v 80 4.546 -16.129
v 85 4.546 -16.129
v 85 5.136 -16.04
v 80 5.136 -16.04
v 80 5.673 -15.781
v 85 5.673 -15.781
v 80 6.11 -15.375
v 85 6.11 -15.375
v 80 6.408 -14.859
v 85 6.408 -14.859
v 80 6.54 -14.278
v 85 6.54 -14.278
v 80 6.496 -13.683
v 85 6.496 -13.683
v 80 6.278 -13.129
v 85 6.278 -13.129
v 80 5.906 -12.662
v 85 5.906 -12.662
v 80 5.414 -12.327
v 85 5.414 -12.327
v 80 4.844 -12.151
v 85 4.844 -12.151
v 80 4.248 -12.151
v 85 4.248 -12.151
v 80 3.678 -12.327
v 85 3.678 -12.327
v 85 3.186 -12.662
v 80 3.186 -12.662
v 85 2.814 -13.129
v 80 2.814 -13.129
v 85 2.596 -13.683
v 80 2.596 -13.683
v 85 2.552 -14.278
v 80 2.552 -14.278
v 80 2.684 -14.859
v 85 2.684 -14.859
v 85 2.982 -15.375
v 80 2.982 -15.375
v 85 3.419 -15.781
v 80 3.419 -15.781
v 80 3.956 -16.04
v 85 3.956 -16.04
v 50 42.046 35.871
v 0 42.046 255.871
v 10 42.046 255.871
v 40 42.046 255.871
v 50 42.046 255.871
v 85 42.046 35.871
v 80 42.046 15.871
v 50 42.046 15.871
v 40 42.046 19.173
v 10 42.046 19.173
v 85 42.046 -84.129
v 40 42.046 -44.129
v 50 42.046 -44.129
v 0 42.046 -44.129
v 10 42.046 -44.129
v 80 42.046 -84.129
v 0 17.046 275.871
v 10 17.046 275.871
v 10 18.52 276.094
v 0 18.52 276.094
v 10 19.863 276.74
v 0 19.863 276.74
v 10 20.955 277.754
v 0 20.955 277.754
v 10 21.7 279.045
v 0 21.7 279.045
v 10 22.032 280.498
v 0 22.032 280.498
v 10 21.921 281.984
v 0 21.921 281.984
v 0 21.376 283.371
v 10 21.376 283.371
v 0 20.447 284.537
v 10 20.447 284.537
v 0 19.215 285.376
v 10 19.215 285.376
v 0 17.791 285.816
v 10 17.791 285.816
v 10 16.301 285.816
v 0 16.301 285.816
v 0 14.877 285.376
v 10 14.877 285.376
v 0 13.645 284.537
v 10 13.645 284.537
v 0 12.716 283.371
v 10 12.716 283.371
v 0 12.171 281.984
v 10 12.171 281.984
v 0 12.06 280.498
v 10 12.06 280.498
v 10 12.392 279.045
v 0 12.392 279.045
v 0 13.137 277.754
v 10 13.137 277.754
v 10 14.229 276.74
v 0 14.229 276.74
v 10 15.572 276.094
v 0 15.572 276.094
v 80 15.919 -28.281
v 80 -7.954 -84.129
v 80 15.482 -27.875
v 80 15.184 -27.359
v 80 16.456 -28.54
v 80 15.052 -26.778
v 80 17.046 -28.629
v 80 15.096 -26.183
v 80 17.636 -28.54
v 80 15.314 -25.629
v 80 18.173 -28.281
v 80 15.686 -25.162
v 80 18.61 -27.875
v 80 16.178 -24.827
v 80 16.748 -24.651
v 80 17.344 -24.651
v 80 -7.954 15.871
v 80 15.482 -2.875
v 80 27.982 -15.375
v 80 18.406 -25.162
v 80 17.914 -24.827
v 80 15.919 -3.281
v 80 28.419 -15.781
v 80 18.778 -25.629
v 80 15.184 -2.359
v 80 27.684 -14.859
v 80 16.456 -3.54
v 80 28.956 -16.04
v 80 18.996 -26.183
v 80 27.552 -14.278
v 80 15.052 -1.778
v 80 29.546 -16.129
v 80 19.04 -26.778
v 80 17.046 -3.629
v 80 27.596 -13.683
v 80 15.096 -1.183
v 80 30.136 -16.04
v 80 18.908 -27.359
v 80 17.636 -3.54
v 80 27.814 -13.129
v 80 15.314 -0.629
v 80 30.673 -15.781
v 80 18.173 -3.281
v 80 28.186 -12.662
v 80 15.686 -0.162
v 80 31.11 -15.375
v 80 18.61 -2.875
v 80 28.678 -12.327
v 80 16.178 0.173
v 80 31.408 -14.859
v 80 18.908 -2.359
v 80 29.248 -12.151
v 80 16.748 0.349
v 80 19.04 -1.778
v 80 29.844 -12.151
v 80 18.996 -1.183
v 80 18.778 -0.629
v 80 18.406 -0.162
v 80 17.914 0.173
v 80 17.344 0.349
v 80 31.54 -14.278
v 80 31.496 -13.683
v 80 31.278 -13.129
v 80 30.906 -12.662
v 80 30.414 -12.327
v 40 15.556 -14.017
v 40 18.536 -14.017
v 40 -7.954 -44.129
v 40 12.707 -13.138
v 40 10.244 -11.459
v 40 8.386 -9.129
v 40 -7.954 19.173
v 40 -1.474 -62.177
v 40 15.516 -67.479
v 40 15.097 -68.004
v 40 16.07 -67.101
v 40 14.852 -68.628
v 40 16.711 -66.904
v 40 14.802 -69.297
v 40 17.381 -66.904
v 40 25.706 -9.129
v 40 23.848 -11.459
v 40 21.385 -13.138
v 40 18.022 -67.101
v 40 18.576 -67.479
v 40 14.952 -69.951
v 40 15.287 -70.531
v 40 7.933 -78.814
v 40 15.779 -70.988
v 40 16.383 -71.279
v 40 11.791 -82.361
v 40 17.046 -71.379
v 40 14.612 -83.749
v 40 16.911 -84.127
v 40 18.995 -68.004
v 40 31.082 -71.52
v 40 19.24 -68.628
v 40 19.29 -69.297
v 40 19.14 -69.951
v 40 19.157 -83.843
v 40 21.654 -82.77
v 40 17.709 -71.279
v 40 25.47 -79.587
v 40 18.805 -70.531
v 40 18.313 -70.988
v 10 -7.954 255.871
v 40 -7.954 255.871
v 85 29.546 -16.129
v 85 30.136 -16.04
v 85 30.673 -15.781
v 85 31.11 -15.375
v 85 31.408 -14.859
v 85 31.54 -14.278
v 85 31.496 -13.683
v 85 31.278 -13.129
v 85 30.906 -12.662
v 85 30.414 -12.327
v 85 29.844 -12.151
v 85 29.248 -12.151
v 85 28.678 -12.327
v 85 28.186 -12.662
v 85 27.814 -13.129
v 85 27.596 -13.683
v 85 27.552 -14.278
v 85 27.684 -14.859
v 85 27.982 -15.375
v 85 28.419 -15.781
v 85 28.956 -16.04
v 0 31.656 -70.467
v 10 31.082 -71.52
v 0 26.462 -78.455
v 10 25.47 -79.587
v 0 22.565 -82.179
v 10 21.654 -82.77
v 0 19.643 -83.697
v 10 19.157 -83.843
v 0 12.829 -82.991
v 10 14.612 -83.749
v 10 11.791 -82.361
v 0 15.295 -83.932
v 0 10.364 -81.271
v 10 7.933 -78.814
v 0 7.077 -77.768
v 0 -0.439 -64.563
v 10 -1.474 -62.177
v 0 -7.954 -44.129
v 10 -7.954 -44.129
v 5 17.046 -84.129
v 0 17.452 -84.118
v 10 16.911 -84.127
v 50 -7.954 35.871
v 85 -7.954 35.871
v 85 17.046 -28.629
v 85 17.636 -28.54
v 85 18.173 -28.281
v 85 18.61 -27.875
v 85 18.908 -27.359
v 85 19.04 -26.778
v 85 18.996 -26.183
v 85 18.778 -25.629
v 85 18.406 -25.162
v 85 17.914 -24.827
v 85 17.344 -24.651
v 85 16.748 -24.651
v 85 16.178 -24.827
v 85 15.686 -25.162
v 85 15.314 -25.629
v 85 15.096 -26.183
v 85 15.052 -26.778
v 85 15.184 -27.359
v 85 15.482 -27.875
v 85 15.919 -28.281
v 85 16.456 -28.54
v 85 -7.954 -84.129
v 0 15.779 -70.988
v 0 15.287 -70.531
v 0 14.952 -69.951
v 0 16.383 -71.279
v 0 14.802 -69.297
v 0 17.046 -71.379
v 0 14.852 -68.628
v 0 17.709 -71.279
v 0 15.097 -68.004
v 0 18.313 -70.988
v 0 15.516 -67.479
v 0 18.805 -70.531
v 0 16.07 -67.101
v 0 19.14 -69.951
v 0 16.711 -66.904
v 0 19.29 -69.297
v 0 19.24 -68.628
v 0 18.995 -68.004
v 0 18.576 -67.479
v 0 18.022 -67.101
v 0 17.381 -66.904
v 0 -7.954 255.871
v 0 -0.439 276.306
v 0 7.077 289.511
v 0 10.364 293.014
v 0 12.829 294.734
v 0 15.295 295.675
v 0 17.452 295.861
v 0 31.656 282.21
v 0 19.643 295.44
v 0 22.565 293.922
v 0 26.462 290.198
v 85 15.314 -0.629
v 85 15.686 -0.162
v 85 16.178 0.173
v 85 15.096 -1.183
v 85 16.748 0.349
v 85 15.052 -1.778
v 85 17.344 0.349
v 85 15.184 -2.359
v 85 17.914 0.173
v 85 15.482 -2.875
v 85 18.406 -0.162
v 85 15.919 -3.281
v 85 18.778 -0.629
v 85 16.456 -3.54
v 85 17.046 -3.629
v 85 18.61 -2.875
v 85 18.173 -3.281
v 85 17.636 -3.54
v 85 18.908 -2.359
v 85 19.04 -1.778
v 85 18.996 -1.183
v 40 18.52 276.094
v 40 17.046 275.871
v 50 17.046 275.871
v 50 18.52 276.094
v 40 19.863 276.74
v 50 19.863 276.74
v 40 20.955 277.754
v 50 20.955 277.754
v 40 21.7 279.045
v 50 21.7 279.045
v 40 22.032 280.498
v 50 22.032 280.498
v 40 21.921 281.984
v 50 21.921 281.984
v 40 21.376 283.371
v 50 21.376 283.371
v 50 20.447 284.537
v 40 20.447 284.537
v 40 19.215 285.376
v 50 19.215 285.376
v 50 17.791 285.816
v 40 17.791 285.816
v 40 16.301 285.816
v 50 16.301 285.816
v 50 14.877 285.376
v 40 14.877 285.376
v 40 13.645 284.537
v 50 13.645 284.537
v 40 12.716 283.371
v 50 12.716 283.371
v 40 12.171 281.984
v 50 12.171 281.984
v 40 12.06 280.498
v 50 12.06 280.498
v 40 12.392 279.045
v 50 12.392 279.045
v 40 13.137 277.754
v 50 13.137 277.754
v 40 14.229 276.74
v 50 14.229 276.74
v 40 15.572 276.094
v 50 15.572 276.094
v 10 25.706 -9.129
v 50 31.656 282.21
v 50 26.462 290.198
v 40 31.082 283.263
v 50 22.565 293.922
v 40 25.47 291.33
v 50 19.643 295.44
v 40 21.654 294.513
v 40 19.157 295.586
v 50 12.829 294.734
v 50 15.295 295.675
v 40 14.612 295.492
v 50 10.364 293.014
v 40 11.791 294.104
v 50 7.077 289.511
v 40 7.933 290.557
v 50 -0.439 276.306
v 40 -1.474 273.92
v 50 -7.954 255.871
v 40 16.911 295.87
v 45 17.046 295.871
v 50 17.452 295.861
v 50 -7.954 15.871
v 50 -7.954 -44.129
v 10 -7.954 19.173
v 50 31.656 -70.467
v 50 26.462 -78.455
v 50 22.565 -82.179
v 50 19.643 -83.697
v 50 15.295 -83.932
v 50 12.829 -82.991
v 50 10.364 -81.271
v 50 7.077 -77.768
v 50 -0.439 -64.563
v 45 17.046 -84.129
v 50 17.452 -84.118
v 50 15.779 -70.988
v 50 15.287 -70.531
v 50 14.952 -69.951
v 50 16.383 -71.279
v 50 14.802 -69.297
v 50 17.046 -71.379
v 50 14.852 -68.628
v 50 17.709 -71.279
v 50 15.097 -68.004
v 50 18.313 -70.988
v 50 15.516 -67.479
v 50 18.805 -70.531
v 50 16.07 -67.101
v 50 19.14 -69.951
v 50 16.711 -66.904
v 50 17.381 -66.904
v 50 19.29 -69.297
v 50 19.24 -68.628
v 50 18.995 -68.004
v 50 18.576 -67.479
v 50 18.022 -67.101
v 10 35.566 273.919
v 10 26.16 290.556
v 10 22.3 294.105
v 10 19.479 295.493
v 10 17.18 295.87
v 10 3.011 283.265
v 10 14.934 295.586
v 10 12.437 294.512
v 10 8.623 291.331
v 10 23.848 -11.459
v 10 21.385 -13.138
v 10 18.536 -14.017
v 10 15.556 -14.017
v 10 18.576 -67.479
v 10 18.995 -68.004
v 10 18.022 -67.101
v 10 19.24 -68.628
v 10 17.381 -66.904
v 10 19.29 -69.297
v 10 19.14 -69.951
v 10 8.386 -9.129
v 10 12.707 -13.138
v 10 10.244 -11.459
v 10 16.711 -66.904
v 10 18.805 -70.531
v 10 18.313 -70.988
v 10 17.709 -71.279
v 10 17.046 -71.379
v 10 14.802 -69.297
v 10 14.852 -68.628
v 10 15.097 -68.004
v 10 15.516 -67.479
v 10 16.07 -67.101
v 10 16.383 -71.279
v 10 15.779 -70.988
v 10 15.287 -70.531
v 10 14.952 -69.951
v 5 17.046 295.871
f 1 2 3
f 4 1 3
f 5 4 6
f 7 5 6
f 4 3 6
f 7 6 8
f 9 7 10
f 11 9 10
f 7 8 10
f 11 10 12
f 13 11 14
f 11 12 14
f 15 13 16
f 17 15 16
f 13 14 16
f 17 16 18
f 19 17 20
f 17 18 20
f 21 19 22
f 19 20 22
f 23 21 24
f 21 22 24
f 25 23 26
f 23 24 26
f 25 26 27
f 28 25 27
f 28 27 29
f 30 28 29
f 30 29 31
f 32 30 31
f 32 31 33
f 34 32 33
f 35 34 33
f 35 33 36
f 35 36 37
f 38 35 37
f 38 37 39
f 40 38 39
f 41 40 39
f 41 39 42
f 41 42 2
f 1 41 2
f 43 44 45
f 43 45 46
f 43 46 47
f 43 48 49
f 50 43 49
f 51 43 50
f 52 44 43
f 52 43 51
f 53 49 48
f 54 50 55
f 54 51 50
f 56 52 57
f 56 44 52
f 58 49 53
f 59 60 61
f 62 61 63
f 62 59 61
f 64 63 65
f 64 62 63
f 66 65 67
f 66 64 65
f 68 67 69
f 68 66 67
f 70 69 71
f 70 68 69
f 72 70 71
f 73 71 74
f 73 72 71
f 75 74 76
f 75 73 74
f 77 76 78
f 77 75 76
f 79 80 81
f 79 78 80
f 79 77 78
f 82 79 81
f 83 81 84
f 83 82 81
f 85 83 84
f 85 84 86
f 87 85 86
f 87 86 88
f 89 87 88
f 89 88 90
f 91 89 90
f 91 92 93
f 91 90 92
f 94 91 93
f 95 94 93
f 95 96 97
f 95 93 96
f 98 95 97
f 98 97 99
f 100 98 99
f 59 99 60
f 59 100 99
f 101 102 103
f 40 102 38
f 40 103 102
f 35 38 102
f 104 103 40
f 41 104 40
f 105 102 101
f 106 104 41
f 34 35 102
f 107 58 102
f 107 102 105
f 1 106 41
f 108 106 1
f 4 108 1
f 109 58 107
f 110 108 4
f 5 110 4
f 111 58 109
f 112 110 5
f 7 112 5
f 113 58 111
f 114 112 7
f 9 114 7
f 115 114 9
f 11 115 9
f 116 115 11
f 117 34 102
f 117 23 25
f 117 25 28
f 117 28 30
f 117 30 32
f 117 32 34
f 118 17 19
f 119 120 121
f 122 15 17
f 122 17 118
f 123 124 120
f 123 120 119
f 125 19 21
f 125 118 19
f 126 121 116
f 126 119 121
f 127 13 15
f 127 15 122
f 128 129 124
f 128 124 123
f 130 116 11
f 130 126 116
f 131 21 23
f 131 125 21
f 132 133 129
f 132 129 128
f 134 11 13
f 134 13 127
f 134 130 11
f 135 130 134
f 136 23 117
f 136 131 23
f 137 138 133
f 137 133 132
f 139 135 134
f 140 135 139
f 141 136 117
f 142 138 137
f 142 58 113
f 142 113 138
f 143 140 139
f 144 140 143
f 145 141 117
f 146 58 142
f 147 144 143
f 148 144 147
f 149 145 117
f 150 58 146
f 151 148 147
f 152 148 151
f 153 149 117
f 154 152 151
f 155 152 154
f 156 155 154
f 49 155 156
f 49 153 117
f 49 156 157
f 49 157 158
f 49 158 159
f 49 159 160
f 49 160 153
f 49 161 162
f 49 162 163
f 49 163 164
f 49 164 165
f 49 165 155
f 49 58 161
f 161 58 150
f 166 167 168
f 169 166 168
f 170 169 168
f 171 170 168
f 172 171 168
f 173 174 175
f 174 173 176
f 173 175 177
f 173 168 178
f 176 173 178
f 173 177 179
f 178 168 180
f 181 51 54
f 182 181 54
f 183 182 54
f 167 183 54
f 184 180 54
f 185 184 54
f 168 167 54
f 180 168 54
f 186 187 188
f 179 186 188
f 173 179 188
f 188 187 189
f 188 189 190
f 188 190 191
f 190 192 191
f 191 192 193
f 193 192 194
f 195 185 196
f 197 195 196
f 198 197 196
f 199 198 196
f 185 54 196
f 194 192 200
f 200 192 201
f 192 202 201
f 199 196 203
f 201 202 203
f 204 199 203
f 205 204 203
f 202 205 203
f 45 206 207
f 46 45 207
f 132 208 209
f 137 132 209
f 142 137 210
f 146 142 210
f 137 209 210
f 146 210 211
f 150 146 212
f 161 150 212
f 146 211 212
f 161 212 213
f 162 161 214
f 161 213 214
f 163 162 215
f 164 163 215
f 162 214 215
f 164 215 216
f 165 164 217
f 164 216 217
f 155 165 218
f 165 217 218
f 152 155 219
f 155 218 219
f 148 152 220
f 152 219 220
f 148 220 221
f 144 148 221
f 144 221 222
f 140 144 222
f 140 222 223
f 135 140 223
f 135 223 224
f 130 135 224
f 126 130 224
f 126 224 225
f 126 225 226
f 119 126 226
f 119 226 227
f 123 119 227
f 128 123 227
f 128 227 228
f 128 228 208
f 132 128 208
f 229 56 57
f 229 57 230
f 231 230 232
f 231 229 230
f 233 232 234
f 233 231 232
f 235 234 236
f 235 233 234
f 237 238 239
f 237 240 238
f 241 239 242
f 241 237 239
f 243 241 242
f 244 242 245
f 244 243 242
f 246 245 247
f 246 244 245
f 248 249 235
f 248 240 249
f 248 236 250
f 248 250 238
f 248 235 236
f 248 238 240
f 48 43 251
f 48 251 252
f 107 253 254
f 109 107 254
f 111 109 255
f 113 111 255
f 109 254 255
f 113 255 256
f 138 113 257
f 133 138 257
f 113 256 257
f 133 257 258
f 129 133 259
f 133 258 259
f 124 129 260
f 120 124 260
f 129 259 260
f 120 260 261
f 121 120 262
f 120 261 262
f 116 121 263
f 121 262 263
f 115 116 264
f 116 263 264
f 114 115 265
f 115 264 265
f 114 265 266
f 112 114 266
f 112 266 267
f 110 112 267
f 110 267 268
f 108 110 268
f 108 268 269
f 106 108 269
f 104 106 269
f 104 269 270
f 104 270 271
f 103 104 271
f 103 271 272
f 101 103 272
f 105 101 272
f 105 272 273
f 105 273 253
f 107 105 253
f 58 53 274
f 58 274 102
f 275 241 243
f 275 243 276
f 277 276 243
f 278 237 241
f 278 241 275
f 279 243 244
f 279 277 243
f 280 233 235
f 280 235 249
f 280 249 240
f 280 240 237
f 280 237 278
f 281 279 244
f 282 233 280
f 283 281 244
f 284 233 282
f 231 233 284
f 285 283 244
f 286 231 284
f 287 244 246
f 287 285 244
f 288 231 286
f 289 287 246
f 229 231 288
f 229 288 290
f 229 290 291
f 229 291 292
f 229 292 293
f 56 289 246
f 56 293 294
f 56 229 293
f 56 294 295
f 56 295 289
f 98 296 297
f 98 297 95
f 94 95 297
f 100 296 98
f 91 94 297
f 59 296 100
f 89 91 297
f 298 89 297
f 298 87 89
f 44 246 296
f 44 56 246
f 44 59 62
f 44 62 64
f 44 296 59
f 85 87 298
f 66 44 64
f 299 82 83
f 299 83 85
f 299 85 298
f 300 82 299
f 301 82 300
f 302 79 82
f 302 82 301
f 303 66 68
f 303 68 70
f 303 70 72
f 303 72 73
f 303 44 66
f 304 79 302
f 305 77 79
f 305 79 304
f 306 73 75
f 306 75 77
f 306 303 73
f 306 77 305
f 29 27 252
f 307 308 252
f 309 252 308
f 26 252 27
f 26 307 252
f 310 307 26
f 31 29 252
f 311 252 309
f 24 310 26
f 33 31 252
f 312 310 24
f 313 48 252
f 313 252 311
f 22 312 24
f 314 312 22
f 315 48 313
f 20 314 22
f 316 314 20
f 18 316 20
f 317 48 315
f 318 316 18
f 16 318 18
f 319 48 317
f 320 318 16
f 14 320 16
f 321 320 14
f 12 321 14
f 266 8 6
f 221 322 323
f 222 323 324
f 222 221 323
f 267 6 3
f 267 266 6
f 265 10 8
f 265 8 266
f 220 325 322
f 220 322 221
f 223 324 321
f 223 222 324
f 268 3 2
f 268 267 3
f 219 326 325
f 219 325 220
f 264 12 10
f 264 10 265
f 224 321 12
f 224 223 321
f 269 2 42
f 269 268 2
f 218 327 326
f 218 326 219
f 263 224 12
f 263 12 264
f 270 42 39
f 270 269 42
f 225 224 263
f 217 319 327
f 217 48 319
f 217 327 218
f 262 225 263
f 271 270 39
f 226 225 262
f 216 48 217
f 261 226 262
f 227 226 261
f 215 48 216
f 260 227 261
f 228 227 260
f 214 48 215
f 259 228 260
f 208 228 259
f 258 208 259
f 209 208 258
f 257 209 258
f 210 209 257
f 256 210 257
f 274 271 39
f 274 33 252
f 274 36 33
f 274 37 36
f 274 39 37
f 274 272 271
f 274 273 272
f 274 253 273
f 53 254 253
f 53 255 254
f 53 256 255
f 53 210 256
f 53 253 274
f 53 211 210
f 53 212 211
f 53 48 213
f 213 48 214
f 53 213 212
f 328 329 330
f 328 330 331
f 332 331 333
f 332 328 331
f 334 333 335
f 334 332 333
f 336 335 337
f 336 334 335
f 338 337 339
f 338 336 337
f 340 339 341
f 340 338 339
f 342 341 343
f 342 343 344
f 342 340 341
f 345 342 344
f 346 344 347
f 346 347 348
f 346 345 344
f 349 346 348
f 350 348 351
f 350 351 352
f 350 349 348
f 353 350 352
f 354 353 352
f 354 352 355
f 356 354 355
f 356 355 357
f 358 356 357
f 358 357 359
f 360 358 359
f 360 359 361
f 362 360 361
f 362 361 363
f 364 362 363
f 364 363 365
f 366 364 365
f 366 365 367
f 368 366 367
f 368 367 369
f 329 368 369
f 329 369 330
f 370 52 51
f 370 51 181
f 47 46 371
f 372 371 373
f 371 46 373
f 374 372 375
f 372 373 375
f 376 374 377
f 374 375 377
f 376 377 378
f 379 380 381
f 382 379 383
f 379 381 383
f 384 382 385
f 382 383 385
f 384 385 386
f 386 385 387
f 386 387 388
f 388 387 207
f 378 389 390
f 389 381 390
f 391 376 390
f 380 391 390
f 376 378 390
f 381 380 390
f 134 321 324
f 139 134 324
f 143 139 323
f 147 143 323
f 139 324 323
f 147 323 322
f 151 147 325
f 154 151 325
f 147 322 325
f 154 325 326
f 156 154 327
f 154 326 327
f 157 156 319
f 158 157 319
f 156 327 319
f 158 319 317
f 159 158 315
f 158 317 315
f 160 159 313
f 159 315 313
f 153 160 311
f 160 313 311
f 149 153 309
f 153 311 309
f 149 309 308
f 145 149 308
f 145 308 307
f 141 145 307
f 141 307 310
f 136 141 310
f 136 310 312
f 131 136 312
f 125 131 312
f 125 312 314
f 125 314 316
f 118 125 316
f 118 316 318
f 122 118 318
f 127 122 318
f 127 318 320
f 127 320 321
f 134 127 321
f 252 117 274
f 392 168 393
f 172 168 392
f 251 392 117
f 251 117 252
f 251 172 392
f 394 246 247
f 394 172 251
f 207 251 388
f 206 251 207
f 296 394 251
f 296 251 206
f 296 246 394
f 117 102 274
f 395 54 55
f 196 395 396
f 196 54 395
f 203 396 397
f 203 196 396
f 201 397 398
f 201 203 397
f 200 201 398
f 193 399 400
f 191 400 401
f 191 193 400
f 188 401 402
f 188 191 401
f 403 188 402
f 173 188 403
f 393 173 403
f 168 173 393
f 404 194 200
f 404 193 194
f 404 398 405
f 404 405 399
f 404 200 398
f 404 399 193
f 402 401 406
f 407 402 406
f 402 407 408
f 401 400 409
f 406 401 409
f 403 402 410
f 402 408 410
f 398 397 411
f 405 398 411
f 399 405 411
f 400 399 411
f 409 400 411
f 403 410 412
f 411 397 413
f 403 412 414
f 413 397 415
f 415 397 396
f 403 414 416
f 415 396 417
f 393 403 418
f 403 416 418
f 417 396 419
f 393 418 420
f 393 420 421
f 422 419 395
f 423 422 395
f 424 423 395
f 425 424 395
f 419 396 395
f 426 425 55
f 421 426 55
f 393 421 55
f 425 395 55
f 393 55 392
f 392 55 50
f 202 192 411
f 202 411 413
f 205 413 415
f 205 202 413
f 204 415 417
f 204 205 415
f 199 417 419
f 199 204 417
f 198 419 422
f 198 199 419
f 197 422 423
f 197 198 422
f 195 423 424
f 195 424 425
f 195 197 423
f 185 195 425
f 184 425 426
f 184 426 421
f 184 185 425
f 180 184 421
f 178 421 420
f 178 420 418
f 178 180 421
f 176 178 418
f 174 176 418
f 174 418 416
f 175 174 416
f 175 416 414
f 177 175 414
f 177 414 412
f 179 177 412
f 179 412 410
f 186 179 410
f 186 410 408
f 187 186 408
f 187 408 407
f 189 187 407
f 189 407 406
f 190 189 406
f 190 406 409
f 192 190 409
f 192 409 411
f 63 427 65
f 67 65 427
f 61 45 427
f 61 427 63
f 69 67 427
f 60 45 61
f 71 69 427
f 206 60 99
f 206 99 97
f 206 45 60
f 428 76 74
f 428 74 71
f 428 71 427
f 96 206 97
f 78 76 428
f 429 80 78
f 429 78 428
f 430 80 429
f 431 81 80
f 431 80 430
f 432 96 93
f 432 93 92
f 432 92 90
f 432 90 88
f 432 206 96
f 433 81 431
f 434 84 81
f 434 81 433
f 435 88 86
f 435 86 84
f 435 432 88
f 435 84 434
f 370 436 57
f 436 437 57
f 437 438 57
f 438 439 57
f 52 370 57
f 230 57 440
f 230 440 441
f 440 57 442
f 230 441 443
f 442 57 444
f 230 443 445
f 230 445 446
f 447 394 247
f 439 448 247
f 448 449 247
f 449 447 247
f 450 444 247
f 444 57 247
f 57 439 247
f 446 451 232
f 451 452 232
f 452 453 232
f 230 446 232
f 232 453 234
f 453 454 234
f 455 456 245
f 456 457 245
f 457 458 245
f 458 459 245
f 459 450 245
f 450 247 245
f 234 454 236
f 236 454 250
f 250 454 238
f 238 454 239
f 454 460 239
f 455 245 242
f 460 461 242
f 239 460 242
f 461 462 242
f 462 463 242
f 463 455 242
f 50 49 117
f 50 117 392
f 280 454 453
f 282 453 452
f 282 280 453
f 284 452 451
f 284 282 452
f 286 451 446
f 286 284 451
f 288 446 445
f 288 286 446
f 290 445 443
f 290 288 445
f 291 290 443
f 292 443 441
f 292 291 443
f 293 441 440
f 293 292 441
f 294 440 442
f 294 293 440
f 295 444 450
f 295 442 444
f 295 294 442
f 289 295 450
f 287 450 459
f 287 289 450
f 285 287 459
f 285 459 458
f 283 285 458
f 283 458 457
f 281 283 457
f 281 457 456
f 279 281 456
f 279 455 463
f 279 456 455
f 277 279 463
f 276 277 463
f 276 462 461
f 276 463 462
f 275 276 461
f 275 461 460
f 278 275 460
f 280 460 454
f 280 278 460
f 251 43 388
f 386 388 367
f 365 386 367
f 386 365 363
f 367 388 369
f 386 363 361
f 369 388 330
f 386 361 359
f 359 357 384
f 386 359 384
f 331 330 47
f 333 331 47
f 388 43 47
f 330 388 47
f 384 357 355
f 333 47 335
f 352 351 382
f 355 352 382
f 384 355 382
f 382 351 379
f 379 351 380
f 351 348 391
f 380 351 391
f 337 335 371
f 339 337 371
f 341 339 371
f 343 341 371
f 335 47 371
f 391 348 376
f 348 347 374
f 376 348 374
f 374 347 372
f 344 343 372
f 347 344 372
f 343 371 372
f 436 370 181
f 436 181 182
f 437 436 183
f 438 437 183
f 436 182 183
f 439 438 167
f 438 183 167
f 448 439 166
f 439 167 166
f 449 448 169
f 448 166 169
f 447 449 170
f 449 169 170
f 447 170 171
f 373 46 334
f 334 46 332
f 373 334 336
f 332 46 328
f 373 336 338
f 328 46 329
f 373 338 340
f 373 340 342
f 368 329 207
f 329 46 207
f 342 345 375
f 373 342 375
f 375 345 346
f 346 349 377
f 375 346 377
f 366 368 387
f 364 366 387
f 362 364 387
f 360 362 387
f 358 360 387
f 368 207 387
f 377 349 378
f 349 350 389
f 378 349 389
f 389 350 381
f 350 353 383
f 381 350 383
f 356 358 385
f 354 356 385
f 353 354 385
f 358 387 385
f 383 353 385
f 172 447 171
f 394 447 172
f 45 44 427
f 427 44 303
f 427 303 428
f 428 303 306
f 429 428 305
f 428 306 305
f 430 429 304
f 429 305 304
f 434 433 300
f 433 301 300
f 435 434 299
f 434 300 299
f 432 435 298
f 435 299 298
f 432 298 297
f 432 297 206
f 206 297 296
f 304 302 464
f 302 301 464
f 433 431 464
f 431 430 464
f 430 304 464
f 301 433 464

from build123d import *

# Parameters (mm, degrees)
SKETCH1_R               = 5
SKETCH1_R_2             = 2.25
BOSS_EXTRUDE1_DEPTH     = 50
CUT_EXTRUDE1_DEPTH      = 52
CUT_EXTRUDE1_DEPTH_BACK = 35
SKETCH2_W               = 30
SKETCH2_H               = 60
SKETCH3_W               = 30
SKETCH3_H               = 40
CUT_EXTRUDE2_DEPTH      = 52
CUT_EXTRUDE3_START      = -10
CUT_EXTRUDE3_DEPTH      = 30
CUT_EXTRUDE4_START      = -10
CUT_EXTRUDE4_DEPTH      = 30
BOSS_EXTRUDE2_DEPTH     = 50
SKETCH8_R               = 2
CUT_EXTRUDE5_DEPTH      = 10
FILLET1_R               = 10


with BuildPart() as part:
    # Sketch1 → Boss-Extrude1 (new body)
    with BuildSketch(Plane(origin=(0, 0, 0), x_dir=(0, 0, -1), z_dir=(1, 0, 0))):
        with BuildLine():
            Line((-255.87149894, 42.046001407), (44.12850106, 42.046001407))
            add(Edge.make_bspline(
                [(44.12850106, 42.046001407), (124.12850106, 17.046001407), (44.12850106, -7.953998593)],
                knots=[0, 0, 0, 1, 1, 1], degree=2))
            Line((44.12850106, -7.953998593), (-255.87149894, -7.953998593))
            add(Edge.make_bspline(
                [(-255.87149894, 42.046001407), (-335.87149894, 17.046001407), (-255.87149894, -7.953998593)],
                knots=[0, 0, 0, 1, 1, 1], degree=2))
        make_face()
        with Locations((-280.87149894, 17.046001407)):
            Circle(SKETCH1_R, mode=Mode.SUBTRACT)
        with Locations((69.12850106, 17.046001407)):
            Circle(SKETCH1_R_2, mode=Mode.SUBTRACT)
    extrude(amount=BOSS_EXTRUDE1_DEPTH)

    # Sketch2 → Cut-Extrude1 (cut, two sides: drawn at the far end of the back side and taken through both)
    with BuildSketch(Plane(origin=(0, 0, 0), x_dir=(1, 0, 0), z_dir=(0, 1, 0)).offset(-CUT_EXTRUDE1_DEPTH_BACK)):
        with Locations((25, 54.12850106)):
            Rectangle(SKETCH2_W, SKETCH2_H)
    extrude(amount=CUT_EXTRUDE1_DEPTH + CUT_EXTRUDE1_DEPTH_BACK, mode=Mode.SUBTRACT)

    # Sketch3 → Cut-Extrude2 (cut)
    with BuildSketch(Plane.XZ.offset(7.953998593)):
        with Locations((25, 275.87149894)):
            Rectangle(SKETCH3_W, SKETCH3_H)
    extrude(amount=-CUT_EXTRUDE2_DEPTH, mode=Mode.SUBTRACT)

    # Sketch4 → Cut-Extrude3 (cut)
    with BuildSketch(Plane.ZY.offset(CUT_EXTRUDE3_START)):
        Polygon((-24.12850106, 17.046001407), (-24.12850106, 42.046001407), (19.172769129, 42.046001407), align=None)
    extrude(amount=-CUT_EXTRUDE3_DEPTH, mode=Mode.SUBTRACT)

    # Sketch5 → Cut-Extrude4 (cut)
    with BuildSketch(Plane.ZY.offset(CUT_EXTRUDE4_START)):
        Polygon((-24.12850106, -7.953998593), (-24.12850106, 17.046001407), (19.172769129, -7.953998593), align=None)
    extrude(amount=-CUT_EXTRUDE4_DEPTH, mode=Mode.SUBTRACT)

    # Sketch6 → Boss-Extrude2 (add)
    with BuildSketch(Plane(origin=(0, 42.046001407, 0), x_dir=(1, 0, 0), z_dir=(0, 1, 0))):
        Polygon((50, -35.87149894), (85, -35.87149894), (85, 84.12850106), (80, 84.12850106), (80, -15.87149894), (50, -15.87149894), align=None)
    extrude(amount=-BOSS_EXTRUDE2_DEPTH)

    # Sketch8 → Cut-Extrude5 (cut)
    with BuildSketch(Plane(origin=(85, 0, 0), x_dir=(0, 0, -1), z_dir=(1, 0, 0))):
        with Locations((14.12850106, 29.546001407)):
            Circle(SKETCH8_R)
        with Locations((26.62850106, 17.046001407)):
            Circle(SKETCH8_R)
        with Locations((14.12850106, 4.546001407)):
            Circle(SKETCH8_R)
        with Locations((1.62850106, 17.046001407)):
            Circle(SKETCH8_R)
    extrude(amount=-CUT_EXTRUDE5_DEPTH, mode=Mode.SUBTRACT)

    # Fillet1
    fillet1_edges = [part.edges().sort_by_distance(p)[0] for p in [
        (25, 17.046001407, -24.12850106),
    ]]
    fillet(fillet1_edges, radius=FILLET1_R)


solid = part.part
